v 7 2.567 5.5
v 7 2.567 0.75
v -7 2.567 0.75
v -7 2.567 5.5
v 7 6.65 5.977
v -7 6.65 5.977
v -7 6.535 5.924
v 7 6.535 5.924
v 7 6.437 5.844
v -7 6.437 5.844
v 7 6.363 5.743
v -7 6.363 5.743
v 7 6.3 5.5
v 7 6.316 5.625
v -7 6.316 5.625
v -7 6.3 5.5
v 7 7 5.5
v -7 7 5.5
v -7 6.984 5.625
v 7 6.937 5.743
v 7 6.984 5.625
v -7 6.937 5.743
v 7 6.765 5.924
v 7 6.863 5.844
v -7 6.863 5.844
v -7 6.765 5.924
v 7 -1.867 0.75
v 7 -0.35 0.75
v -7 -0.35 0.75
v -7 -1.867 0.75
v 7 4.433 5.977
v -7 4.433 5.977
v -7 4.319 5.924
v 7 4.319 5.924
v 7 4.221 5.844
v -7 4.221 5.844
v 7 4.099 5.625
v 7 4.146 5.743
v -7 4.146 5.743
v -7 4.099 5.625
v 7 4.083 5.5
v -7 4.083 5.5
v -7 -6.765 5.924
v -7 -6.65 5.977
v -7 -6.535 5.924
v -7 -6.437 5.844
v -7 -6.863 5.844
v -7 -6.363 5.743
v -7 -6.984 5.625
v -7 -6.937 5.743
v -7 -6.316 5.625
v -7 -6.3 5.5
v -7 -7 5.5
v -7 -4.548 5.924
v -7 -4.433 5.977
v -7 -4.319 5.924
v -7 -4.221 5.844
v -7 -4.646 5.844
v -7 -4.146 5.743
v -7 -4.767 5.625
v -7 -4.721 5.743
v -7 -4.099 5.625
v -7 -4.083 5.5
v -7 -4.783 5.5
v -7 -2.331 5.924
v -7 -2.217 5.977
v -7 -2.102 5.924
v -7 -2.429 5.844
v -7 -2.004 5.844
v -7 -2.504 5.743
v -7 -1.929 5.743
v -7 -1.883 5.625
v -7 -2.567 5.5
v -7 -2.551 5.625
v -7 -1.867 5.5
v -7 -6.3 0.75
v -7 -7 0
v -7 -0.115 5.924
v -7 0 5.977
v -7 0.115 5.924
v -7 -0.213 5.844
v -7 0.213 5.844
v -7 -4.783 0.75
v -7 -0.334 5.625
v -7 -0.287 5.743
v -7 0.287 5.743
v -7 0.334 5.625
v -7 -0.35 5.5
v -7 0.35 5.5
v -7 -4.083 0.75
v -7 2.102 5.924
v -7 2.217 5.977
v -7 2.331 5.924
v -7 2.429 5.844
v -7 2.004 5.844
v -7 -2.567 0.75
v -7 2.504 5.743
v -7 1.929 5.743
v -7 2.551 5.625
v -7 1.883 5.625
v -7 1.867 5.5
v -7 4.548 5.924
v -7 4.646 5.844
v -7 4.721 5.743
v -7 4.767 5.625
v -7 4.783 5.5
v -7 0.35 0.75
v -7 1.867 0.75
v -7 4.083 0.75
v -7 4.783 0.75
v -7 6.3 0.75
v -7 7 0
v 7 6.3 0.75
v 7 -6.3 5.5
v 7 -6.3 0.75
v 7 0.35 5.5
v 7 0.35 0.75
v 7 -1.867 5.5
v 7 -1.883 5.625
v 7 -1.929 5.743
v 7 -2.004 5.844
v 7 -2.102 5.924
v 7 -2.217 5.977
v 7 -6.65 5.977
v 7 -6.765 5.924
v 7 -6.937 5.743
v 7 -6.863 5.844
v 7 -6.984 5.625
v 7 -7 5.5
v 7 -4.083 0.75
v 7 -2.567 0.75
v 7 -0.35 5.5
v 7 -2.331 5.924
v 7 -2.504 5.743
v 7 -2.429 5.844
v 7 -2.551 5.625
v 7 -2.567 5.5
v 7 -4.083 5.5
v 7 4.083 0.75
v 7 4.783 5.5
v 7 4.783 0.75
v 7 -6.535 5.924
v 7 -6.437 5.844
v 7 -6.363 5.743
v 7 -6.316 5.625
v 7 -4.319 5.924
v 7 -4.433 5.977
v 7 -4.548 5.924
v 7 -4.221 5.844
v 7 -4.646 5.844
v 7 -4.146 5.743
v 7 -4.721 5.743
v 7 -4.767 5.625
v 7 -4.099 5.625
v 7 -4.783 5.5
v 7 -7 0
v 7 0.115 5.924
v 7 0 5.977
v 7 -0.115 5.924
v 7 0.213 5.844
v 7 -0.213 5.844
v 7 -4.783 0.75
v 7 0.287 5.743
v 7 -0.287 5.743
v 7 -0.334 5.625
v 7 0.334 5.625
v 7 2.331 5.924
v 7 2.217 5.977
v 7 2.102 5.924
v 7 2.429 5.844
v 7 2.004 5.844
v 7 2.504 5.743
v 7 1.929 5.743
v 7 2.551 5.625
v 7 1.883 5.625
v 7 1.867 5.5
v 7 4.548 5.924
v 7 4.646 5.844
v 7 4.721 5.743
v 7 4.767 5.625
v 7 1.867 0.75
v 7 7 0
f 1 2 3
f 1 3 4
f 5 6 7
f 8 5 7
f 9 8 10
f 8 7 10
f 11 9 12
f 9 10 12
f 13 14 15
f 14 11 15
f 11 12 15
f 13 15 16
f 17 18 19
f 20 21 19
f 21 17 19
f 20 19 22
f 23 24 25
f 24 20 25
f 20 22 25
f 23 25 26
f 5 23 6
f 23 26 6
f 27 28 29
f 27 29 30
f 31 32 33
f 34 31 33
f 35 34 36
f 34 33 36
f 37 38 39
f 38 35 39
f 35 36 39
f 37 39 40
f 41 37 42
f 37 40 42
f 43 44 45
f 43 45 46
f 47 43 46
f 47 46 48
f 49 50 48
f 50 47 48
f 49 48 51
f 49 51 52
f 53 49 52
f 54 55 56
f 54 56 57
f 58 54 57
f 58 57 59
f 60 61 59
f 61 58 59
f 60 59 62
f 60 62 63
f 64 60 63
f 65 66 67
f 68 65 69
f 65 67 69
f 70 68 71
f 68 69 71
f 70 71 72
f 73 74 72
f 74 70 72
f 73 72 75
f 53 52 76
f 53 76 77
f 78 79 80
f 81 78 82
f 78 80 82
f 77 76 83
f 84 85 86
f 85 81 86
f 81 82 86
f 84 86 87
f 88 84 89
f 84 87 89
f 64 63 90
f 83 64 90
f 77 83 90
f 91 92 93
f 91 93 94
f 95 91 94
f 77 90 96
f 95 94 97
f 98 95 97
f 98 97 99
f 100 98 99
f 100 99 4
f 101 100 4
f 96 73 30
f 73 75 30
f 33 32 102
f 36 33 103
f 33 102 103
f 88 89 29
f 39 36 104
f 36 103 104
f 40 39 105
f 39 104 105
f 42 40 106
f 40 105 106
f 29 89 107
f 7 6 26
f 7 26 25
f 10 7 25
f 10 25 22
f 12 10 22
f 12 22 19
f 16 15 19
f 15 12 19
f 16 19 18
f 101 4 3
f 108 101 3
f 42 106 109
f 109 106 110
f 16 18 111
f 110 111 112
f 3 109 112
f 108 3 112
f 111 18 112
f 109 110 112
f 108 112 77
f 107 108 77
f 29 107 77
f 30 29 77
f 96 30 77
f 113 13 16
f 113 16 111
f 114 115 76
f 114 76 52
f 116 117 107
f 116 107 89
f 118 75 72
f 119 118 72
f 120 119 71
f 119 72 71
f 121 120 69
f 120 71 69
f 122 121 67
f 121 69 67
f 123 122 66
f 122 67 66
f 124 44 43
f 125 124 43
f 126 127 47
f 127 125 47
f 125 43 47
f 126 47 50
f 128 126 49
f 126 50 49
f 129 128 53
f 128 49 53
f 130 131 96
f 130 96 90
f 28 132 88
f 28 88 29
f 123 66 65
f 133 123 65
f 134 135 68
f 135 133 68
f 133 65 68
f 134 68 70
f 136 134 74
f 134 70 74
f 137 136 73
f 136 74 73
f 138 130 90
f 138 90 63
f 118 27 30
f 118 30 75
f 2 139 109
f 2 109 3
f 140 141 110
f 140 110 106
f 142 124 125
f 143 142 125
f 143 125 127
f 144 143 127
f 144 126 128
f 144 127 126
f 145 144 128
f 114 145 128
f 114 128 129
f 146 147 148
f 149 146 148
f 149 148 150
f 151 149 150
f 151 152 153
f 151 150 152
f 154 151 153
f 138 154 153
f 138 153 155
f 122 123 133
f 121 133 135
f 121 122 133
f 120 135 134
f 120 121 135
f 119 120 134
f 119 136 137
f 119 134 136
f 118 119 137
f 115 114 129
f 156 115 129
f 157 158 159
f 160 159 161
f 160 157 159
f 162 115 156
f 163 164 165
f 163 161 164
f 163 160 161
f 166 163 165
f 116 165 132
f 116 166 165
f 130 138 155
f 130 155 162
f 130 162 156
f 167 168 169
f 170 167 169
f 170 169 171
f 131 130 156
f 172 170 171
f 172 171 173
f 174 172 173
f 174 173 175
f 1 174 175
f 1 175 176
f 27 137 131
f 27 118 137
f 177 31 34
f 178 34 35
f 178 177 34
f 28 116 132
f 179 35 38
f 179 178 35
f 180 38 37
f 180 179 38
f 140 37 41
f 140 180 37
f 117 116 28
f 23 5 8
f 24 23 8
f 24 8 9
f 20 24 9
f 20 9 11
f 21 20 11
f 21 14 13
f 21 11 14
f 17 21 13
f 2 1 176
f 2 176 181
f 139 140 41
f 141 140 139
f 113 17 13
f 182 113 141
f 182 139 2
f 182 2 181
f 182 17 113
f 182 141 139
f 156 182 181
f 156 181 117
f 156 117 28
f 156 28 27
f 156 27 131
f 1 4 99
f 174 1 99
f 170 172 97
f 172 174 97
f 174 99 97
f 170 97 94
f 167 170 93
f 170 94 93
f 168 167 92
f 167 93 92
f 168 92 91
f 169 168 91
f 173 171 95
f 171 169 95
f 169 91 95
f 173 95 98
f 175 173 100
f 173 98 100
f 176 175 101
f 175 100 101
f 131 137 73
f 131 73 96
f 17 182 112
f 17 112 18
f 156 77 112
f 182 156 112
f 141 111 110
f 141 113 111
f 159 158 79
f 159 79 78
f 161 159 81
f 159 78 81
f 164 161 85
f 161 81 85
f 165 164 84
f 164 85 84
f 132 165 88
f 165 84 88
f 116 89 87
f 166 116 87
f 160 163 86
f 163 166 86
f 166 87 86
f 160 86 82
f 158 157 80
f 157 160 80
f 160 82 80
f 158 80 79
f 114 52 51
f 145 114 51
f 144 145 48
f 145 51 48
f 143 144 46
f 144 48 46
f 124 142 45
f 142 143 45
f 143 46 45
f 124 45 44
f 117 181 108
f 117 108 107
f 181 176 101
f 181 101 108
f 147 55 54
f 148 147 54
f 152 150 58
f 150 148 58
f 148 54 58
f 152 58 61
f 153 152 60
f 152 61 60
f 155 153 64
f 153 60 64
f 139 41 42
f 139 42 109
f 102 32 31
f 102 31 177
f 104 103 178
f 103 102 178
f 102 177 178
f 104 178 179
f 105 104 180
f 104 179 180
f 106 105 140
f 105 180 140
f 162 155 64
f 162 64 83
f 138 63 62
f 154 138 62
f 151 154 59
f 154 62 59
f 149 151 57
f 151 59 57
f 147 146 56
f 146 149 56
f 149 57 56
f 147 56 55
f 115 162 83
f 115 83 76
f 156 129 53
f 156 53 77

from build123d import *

# Parameters (mm, degrees)
BOSS_EXTRUDE1_DEPTH = 7
FILLET1_R           = 0.5


with BuildPart() as part:
    # Sketch1 → Boss-Extrude1 (new, symmetric)
    with BuildSketch(Plane(origin=(0, 0, 0), x_dir=(0, 0, -1), z_dir=(1, 0, 0))):
        Polygon((-6, 4.783333333), (-6, 4.083333333), (-0.75, 4.083333333), (-0.75, 2.566666667), (-6, 2.566666667), (-6, 1.866666667), (-0.75, 1.866666667), (-0.75, 0.35), (-6, 0.35), (-6, -0.35), (-0.75, -0.35), (-0.75, -1.866666667), (-6, -1.866666667), (-6, -2.566666667), (-0.75, -2.566666667), (-0.75, -4.083333333), (-6, -4.083333333), (-6, -4.783333333), (-0.75, -4.783333333), (-0.75, -6.3), (-6, -6.3), (-6, -7), (0, -7), (0, -6.3), (0, -4.783333333), (0, -4.083333333), (0, -2.566666667), (0, -1.866666667), (0, -0.35), (0, 0.35), (0, 1.866666667), (0, 2.566666667), (0, 4.083333333), (0, 4.783333333), (0, 6.3), (0, 7), (-6, 7), (-6, 6.3), (-0.75, 6.3), (-0.75, 4.783333333), align=None)
    extrude(amount=BOSS_EXTRUDE1_DEPTH, both=True)

    # Fillet1
    # the kernel refuses this fillet: 0.5 mm, written as the material it takes off along each edge
    with BuildSketch(Plane(origin=(-8.25, -7, 6), x_dir=(0, 0, -1), z_dir=(1, 0, 0)), Plane(origin=(-8.25, -6.3, 6), x_dir=(0, -1, 0), z_dir=(1, 0, 0)), Plane(origin=(-8.25, -4.783333333, 6), x_dir=(0, 0, -1), z_dir=(1, 0, 0)), Plane(origin=(-8.25, -4.083333333, 6), x_dir=(0, -1, 0), z_dir=(1, 0, 0)), Plane(origin=(-8.25, -2.566666667, 6), x_dir=(0, 0, -1), z_dir=(1, 0, 0)), Plane(origin=(-8.25, -1.866666667, 6), x_dir=(0, -1, 0), z_dir=(1, 0, 0)), Plane(origin=(-8.25, -0.35, 6), x_dir=(0, 0, -1), z_dir=(1, 0, 0)), Plane(origin=(-8.25, 0.35, 6), x_dir=(0, -1, 0), z_dir=(1, 0, 0)), Plane(origin=(-8.25, 1.866666667, 6), x_dir=(0, 0, -1), z_dir=(1, 0, 0)), Plane(origin=(-8.25, 2.566666667, 6), x_dir=(0, -1, 0), z_dir=(1, 0, 0)), Plane(origin=(-8.25, 6.3, 6), x_dir=(0, 0, -1), z_dir=(1, 0, 0)), Plane(origin=(-8.25, 7, 6), x_dir=(0, -1, 0), z_dir=(1, 0, 0))) as fillet1_piece_1:
        with BuildLine():
            CenterArc((FILLET1_R, FILLET1_R), FILLET1_R, 180, 90)
            Line((0, FILLET1_R), (0, 0))
            Line((0, 0), (FILLET1_R, 0))
        make_face()
    extrude(amount=16.5, mode=Mode.SUBTRACT)
    with BuildSketch(Plane(origin=(-8.25, 4.083333333, 6), x_dir=(0, 1, 0), z_dir=(1, 0, 0)), Plane(origin=(8.25, 4.783333333, 6), x_dir=(0, -1, 0), z_dir=(-1, 0, 0))) as fillet1_piece_2:
        with BuildLine():
            CenterArc((FILLET1_R, -FILLET1_R), FILLET1_R, 90, 90)
            Line((0, -FILLET1_R), (0, 0))
            Line((0, 0), (FILLET1_R, 0))
        make_face()
    extrude(amount=16.5, mode=Mode.SUBTRACT)


solid = part.part
